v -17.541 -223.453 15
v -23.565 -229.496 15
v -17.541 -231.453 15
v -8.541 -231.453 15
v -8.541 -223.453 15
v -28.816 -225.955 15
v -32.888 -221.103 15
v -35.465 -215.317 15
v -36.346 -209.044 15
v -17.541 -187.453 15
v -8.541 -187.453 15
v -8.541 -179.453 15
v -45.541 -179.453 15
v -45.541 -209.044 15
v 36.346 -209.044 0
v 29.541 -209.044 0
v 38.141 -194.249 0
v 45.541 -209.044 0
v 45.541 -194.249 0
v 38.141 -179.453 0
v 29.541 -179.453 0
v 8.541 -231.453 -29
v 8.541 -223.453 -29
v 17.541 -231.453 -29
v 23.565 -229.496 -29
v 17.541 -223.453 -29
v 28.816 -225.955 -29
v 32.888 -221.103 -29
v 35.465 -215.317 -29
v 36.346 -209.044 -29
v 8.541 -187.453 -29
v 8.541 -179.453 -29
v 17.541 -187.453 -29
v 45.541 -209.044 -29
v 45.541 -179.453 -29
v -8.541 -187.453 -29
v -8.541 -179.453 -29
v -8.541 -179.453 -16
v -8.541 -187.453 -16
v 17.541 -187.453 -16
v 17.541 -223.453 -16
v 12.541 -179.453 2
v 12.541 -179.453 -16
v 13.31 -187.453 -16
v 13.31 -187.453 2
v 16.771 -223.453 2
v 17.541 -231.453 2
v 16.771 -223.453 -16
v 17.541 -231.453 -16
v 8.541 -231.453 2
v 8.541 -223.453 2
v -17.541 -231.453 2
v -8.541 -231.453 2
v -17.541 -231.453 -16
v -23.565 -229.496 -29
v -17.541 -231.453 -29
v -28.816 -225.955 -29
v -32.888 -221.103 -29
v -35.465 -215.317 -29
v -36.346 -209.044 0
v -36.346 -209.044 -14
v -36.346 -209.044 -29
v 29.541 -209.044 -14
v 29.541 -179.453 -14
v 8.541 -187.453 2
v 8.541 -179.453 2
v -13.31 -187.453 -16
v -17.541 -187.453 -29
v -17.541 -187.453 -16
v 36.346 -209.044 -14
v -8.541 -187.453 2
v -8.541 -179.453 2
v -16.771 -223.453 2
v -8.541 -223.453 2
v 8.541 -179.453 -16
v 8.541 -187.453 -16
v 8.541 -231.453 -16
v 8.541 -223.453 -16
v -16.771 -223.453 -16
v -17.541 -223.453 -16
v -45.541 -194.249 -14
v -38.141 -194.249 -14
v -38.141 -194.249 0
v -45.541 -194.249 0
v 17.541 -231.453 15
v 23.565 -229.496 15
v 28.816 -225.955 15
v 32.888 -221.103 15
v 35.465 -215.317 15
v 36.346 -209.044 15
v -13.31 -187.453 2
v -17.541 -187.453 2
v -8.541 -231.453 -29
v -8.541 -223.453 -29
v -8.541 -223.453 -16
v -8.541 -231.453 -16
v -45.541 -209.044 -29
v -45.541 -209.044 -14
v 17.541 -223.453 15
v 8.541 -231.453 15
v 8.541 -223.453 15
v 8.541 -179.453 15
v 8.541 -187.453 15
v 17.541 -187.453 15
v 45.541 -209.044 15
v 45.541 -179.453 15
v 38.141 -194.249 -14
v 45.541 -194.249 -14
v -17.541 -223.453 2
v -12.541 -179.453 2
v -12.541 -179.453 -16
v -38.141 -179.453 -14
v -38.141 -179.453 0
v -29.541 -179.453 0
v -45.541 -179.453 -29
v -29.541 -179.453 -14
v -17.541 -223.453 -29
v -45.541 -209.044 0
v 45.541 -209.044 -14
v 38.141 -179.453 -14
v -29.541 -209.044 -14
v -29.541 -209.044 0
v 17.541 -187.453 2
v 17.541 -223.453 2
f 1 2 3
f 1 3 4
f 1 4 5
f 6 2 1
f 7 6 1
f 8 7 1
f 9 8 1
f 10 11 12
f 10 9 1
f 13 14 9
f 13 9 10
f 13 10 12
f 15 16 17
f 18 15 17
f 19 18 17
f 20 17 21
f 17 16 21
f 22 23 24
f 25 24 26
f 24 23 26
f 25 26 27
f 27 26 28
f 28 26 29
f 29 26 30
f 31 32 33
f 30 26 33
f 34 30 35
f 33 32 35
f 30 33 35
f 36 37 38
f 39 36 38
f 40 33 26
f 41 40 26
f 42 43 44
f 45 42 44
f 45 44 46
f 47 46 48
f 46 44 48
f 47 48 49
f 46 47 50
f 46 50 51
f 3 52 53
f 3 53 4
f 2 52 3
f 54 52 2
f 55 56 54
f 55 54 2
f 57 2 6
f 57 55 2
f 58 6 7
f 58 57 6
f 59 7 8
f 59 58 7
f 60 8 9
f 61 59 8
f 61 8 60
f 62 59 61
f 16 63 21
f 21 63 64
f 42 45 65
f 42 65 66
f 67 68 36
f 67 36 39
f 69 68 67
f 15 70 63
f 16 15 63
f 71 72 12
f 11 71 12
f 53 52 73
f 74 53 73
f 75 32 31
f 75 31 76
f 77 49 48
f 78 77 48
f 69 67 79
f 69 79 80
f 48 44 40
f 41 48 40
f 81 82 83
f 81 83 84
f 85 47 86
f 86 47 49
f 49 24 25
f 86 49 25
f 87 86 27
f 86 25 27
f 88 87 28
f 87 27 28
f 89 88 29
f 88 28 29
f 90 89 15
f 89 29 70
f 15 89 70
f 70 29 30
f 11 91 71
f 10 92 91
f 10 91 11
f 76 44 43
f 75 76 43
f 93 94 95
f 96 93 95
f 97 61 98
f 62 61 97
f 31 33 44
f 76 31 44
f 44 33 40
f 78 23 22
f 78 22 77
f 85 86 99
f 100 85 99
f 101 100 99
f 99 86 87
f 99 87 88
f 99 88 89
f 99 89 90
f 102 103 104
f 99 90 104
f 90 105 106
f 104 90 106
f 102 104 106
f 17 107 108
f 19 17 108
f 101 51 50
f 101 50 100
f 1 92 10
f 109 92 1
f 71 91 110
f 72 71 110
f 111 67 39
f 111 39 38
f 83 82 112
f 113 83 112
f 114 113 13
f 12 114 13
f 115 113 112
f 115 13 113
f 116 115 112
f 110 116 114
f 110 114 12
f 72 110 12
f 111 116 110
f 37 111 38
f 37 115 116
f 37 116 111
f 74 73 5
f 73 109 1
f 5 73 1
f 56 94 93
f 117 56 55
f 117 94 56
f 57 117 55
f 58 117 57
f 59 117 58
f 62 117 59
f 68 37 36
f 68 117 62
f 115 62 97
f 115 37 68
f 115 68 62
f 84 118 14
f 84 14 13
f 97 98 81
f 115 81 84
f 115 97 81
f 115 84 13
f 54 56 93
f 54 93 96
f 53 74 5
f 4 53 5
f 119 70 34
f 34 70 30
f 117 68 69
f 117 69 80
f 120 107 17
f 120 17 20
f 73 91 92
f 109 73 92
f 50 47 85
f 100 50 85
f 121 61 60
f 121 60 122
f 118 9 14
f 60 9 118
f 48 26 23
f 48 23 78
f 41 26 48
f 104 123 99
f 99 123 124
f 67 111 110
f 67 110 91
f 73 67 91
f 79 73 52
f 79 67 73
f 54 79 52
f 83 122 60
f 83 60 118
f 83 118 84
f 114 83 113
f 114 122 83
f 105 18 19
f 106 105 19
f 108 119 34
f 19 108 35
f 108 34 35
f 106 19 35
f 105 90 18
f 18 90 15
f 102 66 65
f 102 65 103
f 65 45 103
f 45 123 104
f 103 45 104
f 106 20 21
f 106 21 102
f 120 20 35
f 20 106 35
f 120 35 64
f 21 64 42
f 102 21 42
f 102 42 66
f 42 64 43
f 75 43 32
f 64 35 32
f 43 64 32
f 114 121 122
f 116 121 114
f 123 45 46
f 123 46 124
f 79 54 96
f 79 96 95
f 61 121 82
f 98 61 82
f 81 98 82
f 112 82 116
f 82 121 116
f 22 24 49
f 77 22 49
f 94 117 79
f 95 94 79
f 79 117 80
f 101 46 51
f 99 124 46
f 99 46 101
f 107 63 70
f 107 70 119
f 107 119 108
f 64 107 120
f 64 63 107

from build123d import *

# Parameters (mm, degrees)
EXTRUDE_1_DEPTH      = 15
EXTRUDE_1_DEPTH_BACK = 29
SKETCH_7_W           = 15
SKETCH_7_H           = 29.591539244
EXTRUDE_3_DEPTH      = 16
SKETCH_11_W          = 7.4
SKETCH_11_H          = 14.795769622
EXTRUDE_13_DEPTH     = 14
SKETCH_13_W          = 13
SKETCH_13_H          = 8
EXTRUDE_16_DEPTH     = 9
EXTRUDE_17_DEPTH     = 18


with BuildPart() as part:
    # 스케치2 → 보스-돌출1 (new, two sides: drawn at the far end of the back side and taken through both)
    with BuildSketch(Plane(origin=(-51.367729061, 0, 0), x_dir=(1, 0, 0), z_dir=(0, 0, 1)).offset(-EXTRUDE_1_DEPTH_BACK)):
        with BuildLine():
            Line((80.908398657, -179.452946096), (68.908398657, -179.452946096))
            Line((68.908398657, -179.452946096), (68.908398657, -231.452946096))
            ThreePointArc((68.908398657, -231.452946096), (82.389621369, -223.671414091), (87.713958083, -209.04448534))
            Line((87.713958083, -209.04448534), (80.908398657, -209.04448534))
            Line((80.908398657, -209.04448534), (80.908398657, -179.452946096))
        make_face()
    extrude(amount=EXTRUDE_1_DEPTH + EXTRUDE_1_DEPTH_BACK)

    # 스케치7 → 보스-돌출3 (add)
    with BuildSketch(Plane(origin=(29.540669597, 0, 0), x_dir=(0, 0, -1), z_dir=(1, 0, 0))):
        with Locations((-7.5, -194.248715718)):
            Rectangle(SKETCH_7_W, SKETCH_7_H)
        with Locations((21.5, -194.248715718)):
            Rectangle(SKETCH_7_W, SKETCH_7_H)
    extrude(amount=EXTRUDE_3_DEPTH)

    # 스케치11 → 보스-돌출13 (add)
    with BuildSketch(Plane(origin=(-11.922476153, 0, -14), x_dir=(1, 0, 0), z_dir=(0, 0, 1))):
        with Locations((53.76314575, -186.850830907)):
            Rectangle(SKETCH_11_W, SKETCH_11_H)
    extrude(amount=EXTRUDE_13_DEPTH)

    # 스케치13 → 보스-돌출16 (add)
    with BuildSketch(Plane.ZY.offset(-17.540669597)):
        with Locations((8.5, -183.452946096)):
            Rectangle(SKETCH_13_W, SKETCH_13_H)
        with Locations((-22.5, -183.452946096)):
            Rectangle(SKETCH_13_W, SKETCH_13_H)
        with Locations((-22.5, -227.452946096)):
            Rectangle(SKETCH_13_W, SKETCH_13_H)
        with Locations((8.5, -227.452946096)):
            Rectangle(SKETCH_13_W, SKETCH_13_H)
    extrude(amount=EXTRUDE_16_DEPTH)

    # 스케치14 → 보스-돌출17 (add)
    with BuildSketch(Plane.XY.offset(-16)):
        Polygon((17.540669597, -179.452946096), (12.540669597, -179.452946096), (17.540669597, -231.452946096), align=None)
    extrude(amount=EXTRUDE_17_DEPTH)


with BuildPart() as body_2:
    # 대칭 복사2: mirrored copy
    add(part.part.mirror(Plane(origin=(0, 0, 0), x_dir=(0, 0, 1), z_dir=(1, 0, 0))))


solid = Compound([part.part, body_2.part])
